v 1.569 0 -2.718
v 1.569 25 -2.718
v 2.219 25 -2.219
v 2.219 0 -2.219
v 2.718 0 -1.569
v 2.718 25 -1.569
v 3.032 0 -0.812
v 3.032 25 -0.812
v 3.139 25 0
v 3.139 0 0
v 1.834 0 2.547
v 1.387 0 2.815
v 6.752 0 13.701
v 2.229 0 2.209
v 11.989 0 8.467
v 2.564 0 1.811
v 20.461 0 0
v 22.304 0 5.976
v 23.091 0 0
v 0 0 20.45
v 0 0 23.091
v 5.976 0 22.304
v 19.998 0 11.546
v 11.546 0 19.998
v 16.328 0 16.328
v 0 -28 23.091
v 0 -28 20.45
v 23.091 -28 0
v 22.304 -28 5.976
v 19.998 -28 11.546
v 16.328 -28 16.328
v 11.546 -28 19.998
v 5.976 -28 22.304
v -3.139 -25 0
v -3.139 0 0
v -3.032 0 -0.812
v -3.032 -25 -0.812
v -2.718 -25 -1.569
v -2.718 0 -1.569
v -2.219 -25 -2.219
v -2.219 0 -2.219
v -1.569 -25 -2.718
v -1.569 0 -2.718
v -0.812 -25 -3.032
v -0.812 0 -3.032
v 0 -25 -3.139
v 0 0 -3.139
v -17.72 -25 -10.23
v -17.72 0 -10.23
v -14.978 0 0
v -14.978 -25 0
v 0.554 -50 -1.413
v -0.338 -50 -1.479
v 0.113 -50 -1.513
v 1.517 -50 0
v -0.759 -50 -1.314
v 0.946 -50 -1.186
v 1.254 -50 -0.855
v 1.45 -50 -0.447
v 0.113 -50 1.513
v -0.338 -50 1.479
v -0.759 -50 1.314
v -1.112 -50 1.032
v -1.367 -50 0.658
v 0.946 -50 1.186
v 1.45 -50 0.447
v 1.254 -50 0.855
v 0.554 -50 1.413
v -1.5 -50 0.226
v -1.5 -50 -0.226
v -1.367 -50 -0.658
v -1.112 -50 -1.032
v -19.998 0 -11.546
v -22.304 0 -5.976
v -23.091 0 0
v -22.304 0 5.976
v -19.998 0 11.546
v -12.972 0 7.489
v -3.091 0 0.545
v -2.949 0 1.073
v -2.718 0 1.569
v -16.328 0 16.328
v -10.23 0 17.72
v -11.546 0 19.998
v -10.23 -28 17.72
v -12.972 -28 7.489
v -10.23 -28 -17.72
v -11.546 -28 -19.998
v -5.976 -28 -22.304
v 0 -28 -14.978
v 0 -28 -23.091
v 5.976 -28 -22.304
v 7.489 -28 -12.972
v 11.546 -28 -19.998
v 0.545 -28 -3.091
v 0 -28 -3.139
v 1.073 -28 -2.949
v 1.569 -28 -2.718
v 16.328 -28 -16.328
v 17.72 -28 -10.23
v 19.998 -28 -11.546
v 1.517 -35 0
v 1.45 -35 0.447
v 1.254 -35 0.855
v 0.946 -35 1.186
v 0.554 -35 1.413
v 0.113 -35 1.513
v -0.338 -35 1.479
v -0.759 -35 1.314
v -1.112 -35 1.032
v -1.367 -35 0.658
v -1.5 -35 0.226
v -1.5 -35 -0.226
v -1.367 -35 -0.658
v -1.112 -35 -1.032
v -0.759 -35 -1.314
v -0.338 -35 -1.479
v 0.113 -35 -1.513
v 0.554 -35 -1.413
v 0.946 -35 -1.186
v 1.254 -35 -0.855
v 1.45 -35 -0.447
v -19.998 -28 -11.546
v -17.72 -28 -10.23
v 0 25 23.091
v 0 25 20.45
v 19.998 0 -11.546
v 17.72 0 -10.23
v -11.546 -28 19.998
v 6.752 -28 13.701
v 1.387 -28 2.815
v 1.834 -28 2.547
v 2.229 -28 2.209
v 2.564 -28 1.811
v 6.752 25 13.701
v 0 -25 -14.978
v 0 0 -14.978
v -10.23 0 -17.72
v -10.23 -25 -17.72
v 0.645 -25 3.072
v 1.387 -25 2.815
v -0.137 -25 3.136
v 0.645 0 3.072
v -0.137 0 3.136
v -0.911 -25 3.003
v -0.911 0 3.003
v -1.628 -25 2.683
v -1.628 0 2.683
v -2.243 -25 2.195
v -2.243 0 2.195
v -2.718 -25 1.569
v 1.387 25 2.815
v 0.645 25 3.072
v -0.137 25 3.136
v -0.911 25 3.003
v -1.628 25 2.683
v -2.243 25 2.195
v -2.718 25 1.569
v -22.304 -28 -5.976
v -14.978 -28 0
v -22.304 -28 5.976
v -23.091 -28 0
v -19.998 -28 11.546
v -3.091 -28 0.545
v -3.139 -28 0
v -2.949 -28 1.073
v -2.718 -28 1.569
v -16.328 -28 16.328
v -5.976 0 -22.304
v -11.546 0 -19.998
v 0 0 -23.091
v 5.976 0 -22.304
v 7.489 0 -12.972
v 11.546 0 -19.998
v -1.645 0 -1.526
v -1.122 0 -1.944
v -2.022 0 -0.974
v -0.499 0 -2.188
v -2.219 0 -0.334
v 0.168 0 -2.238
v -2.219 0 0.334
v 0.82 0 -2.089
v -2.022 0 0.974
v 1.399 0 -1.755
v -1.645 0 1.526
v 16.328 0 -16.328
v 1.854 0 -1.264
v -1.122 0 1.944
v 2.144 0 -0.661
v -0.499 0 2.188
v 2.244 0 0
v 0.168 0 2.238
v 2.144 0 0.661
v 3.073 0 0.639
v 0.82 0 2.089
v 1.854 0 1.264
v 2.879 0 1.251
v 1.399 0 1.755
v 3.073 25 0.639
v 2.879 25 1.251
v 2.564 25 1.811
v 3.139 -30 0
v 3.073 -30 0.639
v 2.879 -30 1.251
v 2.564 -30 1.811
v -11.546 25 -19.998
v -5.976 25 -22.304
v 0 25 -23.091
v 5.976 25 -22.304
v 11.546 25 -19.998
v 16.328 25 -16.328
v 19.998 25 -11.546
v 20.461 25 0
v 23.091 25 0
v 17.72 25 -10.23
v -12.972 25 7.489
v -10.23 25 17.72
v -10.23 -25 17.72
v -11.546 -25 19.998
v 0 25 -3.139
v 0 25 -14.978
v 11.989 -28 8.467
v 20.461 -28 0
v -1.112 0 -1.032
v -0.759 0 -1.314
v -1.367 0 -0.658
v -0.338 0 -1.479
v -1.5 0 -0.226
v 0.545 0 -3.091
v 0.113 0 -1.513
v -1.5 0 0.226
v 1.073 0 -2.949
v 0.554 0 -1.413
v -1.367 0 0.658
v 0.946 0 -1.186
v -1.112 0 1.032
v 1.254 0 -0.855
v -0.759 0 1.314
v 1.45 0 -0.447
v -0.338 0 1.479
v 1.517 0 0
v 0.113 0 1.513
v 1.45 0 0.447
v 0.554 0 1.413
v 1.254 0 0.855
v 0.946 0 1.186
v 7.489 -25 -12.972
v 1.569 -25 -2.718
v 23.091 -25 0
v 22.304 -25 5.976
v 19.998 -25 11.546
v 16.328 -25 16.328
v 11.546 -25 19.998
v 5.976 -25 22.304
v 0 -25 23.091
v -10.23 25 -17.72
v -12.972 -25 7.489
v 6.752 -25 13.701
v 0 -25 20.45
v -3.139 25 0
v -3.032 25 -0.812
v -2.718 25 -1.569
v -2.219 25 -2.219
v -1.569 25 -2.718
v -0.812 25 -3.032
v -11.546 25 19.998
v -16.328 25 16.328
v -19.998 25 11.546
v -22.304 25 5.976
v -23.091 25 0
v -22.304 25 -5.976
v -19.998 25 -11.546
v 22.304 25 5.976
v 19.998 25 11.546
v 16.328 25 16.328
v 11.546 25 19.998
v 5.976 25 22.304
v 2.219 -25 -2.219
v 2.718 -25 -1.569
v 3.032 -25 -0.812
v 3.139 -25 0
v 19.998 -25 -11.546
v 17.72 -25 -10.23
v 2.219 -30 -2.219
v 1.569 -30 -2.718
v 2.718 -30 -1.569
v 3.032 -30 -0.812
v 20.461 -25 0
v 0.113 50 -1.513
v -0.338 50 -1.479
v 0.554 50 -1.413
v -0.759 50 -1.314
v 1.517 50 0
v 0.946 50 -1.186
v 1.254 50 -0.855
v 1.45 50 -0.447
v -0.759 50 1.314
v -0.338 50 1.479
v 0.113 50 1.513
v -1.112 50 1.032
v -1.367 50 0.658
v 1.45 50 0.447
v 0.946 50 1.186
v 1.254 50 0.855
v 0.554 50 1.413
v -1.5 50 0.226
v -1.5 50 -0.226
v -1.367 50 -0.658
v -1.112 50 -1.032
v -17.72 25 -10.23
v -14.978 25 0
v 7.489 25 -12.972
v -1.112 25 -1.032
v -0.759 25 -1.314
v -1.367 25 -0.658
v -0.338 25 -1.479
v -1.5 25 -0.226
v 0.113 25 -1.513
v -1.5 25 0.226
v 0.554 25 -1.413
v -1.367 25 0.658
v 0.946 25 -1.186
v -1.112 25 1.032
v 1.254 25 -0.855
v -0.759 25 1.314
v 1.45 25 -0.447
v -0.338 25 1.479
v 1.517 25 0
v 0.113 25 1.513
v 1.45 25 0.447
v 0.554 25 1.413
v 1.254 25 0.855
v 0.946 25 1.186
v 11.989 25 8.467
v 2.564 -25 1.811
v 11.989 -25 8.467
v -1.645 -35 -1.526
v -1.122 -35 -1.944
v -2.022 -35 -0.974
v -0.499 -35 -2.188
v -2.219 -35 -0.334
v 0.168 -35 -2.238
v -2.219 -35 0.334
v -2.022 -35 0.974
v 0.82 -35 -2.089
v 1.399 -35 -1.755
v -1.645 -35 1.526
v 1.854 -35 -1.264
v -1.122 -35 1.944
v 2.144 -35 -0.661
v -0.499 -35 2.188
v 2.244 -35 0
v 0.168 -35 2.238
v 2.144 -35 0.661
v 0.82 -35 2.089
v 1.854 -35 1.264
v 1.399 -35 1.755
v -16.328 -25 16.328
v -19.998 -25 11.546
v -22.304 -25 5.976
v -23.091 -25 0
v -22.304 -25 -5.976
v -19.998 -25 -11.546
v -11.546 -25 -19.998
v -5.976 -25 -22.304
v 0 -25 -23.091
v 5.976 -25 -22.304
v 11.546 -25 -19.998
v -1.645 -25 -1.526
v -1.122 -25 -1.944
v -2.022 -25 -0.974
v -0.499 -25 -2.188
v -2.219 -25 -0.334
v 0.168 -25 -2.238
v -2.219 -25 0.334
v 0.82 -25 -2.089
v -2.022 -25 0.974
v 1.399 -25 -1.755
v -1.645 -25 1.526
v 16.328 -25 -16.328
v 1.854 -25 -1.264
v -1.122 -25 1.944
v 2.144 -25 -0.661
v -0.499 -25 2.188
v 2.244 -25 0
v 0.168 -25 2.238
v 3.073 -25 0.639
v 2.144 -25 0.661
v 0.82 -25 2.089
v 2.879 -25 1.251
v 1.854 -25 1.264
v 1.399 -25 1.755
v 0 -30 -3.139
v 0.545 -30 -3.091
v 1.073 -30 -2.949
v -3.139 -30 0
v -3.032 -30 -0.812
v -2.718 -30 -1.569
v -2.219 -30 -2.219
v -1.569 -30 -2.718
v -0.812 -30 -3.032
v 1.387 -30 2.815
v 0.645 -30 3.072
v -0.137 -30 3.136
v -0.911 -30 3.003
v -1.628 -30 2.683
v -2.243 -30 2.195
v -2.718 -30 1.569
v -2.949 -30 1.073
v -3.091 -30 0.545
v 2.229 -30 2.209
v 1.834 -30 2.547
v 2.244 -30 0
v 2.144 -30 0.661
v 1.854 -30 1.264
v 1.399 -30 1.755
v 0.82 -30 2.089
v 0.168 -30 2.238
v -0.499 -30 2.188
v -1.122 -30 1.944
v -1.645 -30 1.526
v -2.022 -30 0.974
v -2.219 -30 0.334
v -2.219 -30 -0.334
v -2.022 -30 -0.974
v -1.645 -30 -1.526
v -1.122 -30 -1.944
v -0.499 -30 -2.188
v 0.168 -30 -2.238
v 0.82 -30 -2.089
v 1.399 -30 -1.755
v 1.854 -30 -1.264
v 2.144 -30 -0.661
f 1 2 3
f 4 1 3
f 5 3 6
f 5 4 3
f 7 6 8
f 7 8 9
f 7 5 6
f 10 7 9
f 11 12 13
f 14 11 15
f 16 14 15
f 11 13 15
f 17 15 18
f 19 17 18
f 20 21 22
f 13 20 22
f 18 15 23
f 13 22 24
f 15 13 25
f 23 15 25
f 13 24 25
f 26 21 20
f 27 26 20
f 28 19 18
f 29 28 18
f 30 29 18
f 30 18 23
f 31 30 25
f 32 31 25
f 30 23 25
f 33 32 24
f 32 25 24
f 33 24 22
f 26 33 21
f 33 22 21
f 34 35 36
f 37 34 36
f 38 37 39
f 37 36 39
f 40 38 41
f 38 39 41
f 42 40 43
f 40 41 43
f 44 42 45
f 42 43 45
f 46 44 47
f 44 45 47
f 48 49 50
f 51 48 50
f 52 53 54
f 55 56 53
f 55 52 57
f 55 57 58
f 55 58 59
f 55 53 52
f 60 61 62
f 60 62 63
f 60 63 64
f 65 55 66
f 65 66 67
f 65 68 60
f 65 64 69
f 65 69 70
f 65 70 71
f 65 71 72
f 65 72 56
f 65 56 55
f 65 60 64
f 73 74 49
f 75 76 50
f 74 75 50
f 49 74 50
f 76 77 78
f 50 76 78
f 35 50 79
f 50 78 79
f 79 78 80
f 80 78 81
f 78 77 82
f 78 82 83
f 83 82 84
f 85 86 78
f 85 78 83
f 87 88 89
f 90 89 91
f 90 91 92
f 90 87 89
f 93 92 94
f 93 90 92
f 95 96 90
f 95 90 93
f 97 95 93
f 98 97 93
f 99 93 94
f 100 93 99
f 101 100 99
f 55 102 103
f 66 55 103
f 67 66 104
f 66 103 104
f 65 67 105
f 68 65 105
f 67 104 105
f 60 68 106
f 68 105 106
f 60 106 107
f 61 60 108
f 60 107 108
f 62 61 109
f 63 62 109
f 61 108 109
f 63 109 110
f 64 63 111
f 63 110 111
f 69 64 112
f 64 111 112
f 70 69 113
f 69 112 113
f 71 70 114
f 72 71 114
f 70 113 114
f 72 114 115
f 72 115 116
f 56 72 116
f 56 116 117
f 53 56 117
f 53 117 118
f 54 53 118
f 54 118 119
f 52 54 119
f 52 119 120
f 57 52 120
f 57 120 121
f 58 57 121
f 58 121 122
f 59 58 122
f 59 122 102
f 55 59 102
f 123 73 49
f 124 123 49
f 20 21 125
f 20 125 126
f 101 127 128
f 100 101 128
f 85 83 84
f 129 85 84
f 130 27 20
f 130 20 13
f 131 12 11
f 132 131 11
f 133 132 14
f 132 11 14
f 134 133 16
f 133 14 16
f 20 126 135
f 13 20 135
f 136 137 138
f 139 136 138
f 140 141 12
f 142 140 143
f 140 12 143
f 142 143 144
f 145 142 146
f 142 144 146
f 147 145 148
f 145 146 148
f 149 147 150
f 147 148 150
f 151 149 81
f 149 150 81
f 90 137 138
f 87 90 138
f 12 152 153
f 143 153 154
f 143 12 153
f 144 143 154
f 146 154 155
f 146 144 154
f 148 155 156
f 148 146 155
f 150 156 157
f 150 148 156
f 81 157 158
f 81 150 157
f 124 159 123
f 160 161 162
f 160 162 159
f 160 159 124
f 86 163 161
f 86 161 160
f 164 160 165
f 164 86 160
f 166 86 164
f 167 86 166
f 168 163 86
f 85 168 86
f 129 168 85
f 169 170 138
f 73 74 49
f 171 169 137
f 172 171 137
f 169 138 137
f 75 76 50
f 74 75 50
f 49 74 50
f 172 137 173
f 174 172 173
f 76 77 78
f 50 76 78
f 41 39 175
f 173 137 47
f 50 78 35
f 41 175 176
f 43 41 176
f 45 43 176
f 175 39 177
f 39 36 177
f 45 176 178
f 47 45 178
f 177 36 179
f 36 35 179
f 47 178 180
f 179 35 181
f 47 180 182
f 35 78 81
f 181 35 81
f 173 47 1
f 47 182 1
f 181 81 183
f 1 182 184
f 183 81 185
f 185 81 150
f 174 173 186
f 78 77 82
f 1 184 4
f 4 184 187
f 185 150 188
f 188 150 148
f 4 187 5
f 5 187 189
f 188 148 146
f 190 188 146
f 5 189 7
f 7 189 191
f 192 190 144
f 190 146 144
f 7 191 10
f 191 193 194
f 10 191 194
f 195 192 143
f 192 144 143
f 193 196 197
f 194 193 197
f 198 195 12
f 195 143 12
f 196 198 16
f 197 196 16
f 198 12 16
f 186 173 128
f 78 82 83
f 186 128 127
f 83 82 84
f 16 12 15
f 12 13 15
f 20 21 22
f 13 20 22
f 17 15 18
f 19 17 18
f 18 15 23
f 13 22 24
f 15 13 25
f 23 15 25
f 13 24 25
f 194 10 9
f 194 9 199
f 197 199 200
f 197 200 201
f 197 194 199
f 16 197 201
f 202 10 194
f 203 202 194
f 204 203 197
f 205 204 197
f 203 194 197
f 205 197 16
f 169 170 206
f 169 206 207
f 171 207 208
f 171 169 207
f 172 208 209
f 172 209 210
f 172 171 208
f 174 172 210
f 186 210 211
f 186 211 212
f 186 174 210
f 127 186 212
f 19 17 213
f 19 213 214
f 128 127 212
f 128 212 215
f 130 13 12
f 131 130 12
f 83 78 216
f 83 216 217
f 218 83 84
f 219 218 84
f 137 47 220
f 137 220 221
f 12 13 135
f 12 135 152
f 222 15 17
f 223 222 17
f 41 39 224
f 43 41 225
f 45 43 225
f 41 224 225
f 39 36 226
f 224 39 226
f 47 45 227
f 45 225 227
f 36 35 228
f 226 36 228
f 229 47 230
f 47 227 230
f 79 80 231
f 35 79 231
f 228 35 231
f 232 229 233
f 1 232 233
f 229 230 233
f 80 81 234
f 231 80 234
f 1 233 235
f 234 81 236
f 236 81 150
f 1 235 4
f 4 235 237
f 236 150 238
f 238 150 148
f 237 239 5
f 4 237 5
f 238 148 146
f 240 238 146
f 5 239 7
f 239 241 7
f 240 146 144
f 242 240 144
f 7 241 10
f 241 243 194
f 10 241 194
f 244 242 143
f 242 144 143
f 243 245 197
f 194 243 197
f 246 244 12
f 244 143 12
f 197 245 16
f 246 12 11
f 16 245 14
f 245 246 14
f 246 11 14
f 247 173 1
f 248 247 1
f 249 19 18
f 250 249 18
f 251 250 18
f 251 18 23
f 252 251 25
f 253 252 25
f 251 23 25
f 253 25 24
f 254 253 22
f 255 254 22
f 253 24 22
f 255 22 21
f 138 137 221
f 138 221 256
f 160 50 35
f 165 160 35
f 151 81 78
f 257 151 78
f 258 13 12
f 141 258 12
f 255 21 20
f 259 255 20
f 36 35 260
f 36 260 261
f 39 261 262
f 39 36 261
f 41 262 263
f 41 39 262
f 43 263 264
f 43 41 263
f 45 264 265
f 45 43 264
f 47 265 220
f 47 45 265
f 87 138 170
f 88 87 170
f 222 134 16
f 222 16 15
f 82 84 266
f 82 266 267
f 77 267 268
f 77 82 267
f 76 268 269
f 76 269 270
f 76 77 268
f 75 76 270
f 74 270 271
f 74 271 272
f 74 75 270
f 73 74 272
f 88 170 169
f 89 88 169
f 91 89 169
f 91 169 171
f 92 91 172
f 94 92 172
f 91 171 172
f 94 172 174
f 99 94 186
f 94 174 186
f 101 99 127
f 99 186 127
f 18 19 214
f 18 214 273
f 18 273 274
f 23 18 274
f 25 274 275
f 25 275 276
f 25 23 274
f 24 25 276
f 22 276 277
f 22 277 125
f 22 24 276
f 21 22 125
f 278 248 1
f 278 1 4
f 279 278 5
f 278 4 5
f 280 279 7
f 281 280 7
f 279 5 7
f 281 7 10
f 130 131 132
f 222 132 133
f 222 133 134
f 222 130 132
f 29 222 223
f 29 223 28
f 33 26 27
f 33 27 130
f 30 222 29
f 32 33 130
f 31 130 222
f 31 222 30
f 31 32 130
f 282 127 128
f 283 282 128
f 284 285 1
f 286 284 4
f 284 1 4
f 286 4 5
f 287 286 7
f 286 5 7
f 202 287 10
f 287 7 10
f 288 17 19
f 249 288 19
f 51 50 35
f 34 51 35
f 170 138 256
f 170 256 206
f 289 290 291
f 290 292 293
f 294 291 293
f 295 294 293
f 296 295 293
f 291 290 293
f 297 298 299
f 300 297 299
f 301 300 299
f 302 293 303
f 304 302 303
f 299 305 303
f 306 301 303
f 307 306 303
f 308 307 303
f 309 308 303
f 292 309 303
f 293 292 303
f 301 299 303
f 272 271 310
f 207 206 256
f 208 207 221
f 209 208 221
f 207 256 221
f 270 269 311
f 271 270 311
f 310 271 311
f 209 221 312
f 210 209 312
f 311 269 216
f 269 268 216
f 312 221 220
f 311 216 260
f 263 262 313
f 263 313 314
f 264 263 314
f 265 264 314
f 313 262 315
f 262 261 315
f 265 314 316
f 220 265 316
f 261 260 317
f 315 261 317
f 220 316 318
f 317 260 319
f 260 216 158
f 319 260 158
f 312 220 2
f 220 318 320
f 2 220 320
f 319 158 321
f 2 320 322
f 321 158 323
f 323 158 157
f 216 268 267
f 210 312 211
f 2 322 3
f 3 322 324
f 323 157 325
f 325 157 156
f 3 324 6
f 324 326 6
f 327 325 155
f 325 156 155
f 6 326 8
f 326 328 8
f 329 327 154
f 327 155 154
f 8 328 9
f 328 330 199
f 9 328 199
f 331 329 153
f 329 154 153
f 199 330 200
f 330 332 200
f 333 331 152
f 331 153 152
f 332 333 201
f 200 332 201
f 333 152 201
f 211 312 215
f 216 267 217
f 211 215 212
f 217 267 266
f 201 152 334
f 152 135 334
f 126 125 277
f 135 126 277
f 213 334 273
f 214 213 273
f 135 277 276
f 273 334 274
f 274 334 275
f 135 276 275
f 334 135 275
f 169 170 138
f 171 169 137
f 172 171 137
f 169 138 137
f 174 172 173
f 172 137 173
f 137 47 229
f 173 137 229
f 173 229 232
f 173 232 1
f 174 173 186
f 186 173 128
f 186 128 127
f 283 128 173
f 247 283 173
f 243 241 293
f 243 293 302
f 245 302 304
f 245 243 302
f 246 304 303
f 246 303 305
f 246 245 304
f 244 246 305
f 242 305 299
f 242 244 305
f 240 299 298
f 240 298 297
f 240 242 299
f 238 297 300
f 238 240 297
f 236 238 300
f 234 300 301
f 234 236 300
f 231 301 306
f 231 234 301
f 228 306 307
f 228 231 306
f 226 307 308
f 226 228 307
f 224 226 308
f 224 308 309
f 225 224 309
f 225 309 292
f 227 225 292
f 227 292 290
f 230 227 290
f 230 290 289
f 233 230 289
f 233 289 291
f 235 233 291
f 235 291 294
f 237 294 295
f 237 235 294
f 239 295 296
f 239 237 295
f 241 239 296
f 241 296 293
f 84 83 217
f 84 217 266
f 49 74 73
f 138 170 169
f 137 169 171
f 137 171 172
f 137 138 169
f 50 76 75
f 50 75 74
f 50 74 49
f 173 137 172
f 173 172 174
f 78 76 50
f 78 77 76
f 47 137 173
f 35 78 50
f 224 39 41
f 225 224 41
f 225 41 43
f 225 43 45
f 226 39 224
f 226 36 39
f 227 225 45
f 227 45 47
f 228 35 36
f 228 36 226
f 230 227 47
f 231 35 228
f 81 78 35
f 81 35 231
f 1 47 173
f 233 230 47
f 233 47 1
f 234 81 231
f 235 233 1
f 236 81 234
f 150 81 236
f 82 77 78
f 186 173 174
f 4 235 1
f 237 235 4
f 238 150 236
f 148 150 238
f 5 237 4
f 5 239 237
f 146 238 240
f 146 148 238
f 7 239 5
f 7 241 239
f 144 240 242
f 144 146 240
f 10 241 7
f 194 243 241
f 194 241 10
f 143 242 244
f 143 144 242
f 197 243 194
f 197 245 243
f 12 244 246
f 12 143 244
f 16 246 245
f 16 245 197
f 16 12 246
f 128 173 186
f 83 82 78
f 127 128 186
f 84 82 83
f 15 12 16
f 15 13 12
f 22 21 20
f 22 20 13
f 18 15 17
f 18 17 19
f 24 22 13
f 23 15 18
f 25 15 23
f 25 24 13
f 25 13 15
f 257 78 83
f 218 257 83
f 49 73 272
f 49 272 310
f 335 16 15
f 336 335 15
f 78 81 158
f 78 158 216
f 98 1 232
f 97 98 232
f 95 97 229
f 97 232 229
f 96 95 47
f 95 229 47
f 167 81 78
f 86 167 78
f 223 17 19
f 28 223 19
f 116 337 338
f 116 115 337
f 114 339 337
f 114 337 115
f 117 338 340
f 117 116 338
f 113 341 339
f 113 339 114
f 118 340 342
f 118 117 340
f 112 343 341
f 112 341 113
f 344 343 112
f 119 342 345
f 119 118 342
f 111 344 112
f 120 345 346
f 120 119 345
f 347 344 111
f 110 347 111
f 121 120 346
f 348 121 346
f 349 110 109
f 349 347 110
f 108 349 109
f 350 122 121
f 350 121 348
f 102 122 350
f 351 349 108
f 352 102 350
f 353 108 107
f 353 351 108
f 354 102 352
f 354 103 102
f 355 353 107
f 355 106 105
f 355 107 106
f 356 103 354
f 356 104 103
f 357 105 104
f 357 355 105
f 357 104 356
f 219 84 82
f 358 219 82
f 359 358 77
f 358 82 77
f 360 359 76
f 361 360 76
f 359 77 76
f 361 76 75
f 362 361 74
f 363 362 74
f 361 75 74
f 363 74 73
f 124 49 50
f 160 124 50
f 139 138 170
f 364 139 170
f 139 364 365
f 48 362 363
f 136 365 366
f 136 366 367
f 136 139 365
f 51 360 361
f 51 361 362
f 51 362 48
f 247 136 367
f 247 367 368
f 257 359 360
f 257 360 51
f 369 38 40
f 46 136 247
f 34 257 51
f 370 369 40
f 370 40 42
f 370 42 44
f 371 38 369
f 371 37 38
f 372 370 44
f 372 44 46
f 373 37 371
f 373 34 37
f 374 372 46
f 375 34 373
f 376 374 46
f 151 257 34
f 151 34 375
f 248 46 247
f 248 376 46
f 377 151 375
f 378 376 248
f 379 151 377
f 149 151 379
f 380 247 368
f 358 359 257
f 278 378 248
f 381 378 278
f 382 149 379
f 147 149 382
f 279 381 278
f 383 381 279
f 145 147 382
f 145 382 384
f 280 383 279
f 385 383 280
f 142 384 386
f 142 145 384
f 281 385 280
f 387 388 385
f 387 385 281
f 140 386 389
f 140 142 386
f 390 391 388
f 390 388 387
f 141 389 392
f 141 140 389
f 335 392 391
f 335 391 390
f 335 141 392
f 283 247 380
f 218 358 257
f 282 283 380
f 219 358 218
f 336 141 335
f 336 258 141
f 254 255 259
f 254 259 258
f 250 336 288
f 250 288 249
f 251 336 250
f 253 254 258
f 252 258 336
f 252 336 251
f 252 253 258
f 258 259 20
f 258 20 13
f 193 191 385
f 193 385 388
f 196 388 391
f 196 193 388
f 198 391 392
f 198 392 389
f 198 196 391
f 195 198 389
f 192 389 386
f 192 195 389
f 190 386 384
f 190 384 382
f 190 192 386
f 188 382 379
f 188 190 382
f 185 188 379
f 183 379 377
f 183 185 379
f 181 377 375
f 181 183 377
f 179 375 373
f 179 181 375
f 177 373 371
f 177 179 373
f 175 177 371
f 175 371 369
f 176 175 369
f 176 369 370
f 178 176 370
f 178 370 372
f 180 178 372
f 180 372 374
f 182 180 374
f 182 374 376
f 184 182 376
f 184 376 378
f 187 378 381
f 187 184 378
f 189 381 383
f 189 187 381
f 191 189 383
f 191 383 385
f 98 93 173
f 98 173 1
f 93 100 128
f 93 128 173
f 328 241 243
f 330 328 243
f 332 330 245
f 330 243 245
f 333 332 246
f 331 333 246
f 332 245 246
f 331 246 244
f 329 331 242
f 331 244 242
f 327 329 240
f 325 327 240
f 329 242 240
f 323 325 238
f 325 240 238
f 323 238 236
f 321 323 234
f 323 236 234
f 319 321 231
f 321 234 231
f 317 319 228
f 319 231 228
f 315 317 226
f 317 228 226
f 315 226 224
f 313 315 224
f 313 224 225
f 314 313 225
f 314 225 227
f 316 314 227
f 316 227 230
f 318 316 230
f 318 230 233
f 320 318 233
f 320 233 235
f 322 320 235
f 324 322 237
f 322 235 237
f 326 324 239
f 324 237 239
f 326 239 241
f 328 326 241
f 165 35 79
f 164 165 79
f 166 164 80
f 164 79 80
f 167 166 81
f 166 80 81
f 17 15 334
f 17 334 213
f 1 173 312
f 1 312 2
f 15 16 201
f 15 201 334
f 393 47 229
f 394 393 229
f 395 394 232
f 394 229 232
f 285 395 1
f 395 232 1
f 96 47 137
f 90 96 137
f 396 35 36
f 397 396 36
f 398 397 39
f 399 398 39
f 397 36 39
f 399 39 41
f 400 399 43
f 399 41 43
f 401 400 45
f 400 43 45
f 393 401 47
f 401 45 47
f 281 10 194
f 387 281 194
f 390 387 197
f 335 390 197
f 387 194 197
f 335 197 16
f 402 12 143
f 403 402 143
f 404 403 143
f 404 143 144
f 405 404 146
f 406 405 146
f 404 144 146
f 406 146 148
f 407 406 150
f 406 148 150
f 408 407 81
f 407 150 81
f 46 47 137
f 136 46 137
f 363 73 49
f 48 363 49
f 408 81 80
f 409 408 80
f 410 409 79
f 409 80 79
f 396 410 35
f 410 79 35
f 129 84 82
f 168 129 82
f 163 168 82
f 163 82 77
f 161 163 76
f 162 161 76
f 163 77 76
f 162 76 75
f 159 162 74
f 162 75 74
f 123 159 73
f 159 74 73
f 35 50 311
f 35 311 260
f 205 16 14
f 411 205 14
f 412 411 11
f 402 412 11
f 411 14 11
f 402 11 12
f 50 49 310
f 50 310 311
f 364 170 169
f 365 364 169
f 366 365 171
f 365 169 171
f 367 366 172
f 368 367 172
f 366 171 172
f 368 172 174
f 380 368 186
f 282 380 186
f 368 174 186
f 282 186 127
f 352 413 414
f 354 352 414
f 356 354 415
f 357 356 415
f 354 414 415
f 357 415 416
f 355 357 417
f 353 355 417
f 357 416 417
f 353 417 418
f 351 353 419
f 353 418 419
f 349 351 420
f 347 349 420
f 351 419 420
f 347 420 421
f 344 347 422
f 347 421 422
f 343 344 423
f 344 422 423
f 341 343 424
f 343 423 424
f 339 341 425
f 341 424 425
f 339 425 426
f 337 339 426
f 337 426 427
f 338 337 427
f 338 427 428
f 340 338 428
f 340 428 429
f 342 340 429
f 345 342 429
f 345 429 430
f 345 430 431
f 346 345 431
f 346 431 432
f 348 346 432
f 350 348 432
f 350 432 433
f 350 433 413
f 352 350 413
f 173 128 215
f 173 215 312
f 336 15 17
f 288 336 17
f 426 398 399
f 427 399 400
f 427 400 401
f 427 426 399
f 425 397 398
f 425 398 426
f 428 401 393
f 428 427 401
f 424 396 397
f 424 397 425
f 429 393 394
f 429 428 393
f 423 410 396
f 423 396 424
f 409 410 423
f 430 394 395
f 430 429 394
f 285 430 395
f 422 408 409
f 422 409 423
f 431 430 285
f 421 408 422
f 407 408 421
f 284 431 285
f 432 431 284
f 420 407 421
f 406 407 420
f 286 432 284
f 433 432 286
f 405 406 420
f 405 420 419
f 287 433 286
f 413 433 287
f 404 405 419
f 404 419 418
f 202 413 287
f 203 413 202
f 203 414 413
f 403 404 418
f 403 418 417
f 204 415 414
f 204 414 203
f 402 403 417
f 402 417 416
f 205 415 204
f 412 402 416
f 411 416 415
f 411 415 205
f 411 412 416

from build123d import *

# Parameters (mm, degrees)
F1_DEPTH = 28
F0_R     = 2.244167
F2_DEPTH = 30
F0_R_2   = 1.517404
F3_DEPTH = 35
F4_DEPTH = 50
F5_DEPTH = 50
F6_DEPTH = 25
F7_DEPTH = 25


with BuildPart() as f1:
    # F0 (on Front) → F1 (new body)
    with BuildSketch(Plane.XZ):
        with BuildLine():
            ThreePointArc((-3.138548, 0), (-3.031604, 0.812316), (-2.718062, 1.569274))
            Line((-2.718062, 1.569274), (-12.971652, 7.489187))
            Line((-12.971652, 7.489187), (-10.23042, 17.719606))
            Line((-10.23042, 17.719606), (-11.545612, 19.997586))
            ThreePointArc((-11.545612, 19.997586), (-22.30441, 5.976449), (-19.997586, -11.545612))
            Line((-19.997586, -11.545612), (-17.719606, -10.23042))
            Line((-17.719606, -10.23042), (-14.978374, 0))
            Line((-14.978374, 0), (-3.138548, 0))
        make_face()
        with BuildLine():
            ThreePointArc((1.38747, 2.81521), (2.038439, 2.386472), (2.563677, 1.810537))
            Line((2.563677, 1.810537), (11.989142, 8.467054))
            Line((11.989142, 8.467054), (20.460839, 0))
            Line((20.460839, 0), (23.091224, 0))
            ThreePointArc((23.091224, 0), (16.327961, 16.327961), (0, 23.091224))
            Line((0, 23.091224), (0, 20.449624))
            Line((0, 20.449624), (6.752447, 13.700878))
            Line((6.752447, 13.700878), (1.38747, 2.81521))
        make_face()
        with BuildLine():
            Line((7.489187, -12.971652), (1.569274, -2.718062))
            ThreePointArc((1.569274, -2.718062), (0.812316, -3.031604), (0, -3.138548))
            Line((0, -3.138548), (0, -14.978374))
            Line((0, -14.978374), (-10.23042, -17.719606))
            Line((-10.23042, -17.719606), (-11.545612, -19.997586))
            ThreePointArc((-11.545612, -19.997586), (5.976449, -22.30441), (19.997586, -11.545612))
            Line((19.997586, -11.545612), (17.719606, -10.23042))
            Line((17.719606, -10.23042), (7.489187, -12.971652))
        make_face()
    extrude(amount=F1_DEPTH)


with BuildPart() as f2:
    # F0 (on Front) → F2 (new body)
    with BuildSketch(Plane.XZ):
        with BuildLine():
            ThreePointArc((1.569274, -2.718062), (2.718062, -1.569274), (3.138548, 0))
            ThreePointArc((3.138548, 0), (2.99138, 0.949806), (2.563677, 1.810537))
            ThreePointArc((2.563677, 1.810537), (2.038439, 2.386472), (1.38747, 2.81521))
            ThreePointArc((1.38747, 2.81521), (-0.911432, 3.003294), (-2.718062, 1.569274))
            ThreePointArc((-2.718062, 1.569274), (-3.031604, 0.812316), (-3.138548, 0))
            ThreePointArc((-3.138548, 0), (-2.219288, -2.219288), (0, -3.138548))
            ThreePointArc((0, -3.138548), (0.812316, -3.031604), (1.569274, -2.718062))
        make_face()
        Circle(F0_R, mode=Mode.SUBTRACT)
    extrude(amount=F2_DEPTH)

    # F0 (on Front) → F3 (join)
    with BuildSketch(Plane.XZ):
        Circle(F0_R)
        Circle(F0_R_2, mode=Mode.SUBTRACT)
    extrude(amount=F3_DEPTH)

    # F0 (on Front) → F4 (join)
    with BuildSketch(Plane.XZ):
        Circle(F0_R_2)
    extrude(amount=F4_DEPTH)

    # F0 (on Front) → F5 (join)
    with BuildSketch(Plane.XZ):
        Circle(F0_R_2)
    extrude(amount=-F5_DEPTH)


with BuildPart() as f6:
    # F0 (on Front) → F6 (new body)
    with BuildSketch(Plane.XZ):
        with BuildLine():
            ThreePointArc((1.38747, 2.81521), (2.038439, 2.386472), (2.563677, 1.810537))
            Line((2.563677, 1.810537), (11.989142, 8.467054))
            Line((11.989142, 8.467054), (20.460839, 0))
            Line((20.460839, 0), (23.091224, 0))
            ThreePointArc((23.091224, 0), (16.327961, 16.327961), (0, 23.091224))
            Line((0, 23.091224), (0, 20.449624))
            Line((0, 20.449624), (6.752447, 13.700878))
            Line((6.752447, 13.700878), (1.38747, 2.81521))
        make_face()
        with BuildLine():
            ThreePointArc((-3.138548, 0), (-3.031604, 0.812316), (-2.718062, 1.569274))
            Line((-2.718062, 1.569274), (-12.971652, 7.489187))
            Line((-12.971652, 7.489187), (-10.23042, 17.719606))
            Line((-10.23042, 17.719606), (-11.545612, 19.997586))
            ThreePointArc((-11.545612, 19.997586), (-22.30441, 5.976449), (-19.997586, -11.545612))
            Line((-19.997586, -11.545612), (-17.719606, -10.23042))
            Line((-17.719606, -10.23042), (-14.978374, 0))
            Line((-14.978374, 0), (-3.138548, 0))
        make_face()
        with BuildLine():
            Line((7.489187, -12.971652), (1.569274, -2.718062))
            ThreePointArc((1.569274, -2.718062), (0.812316, -3.031604), (0, -3.138548))
            Line((0, -3.138548), (0, -14.978374))
            Line((0, -14.978374), (-10.23042, -17.719606))
            Line((-10.23042, -17.719606), (-11.545612, -19.997586))
            ThreePointArc((-11.545612, -19.997586), (5.976449, -22.30441), (19.997586, -11.545612))
            Line((19.997586, -11.545612), (17.719606, -10.23042))
            Line((17.719606, -10.23042), (7.489187, -12.971652))
        make_face()
        with BuildLine():
            ThreePointArc((1.569274, -2.718062), (2.718062, -1.569274), (3.138548, 0))
            ThreePointArc((3.138548, 0), (2.99138, 0.949806), (2.563677, 1.810537))
            ThreePointArc((2.563677, 1.810537), (2.038439, 2.386472), (1.38747, 2.81521))
            ThreePointArc((1.38747, 2.81521), (-0.911432, 3.003294), (-2.718062, 1.569274))
            ThreePointArc((-2.718062, 1.569274), (-3.031604, 0.812316), (-3.138548, 0))
            ThreePointArc((-3.138548, 0), (-2.219288, -2.219288), (0, -3.138548))
            ThreePointArc((0, -3.138548), (0.812316, -3.031604), (1.569274, -2.718062))
        make_face()
        Circle(F0_R, mode=Mode.SUBTRACT)
        Circle(F0_R)
        Circle(F0_R_2, mode=Mode.SUBTRACT)
    extrude(amount=-F6_DEPTH)


with BuildPart() as f7:
    # F0 (on Front) → F7 (new body)
    with BuildSketch(Plane.XZ):
        with BuildLine():
            ThreePointArc((1.569274, -2.718062), (2.718062, -1.569274), (3.138548, 0))
            ThreePointArc((3.138548, 0), (2.99138, 0.949806), (2.563677, 1.810537))
            ThreePointArc((2.563677, 1.810537), (2.038439, 2.386472), (1.38747, 2.81521))
            ThreePointArc((1.38747, 2.81521), (-0.911432, 3.003294), (-2.718062, 1.569274))
            ThreePointArc((-2.718062, 1.569274), (-3.031604, 0.812316), (-3.138548, 0))
            ThreePointArc((-3.138548, 0), (-2.219288, -2.219288), (0, -3.138548))
            ThreePointArc((0, -3.138548), (0.812316, -3.031604), (1.569274, -2.718062))
        make_face()
        Circle(F0_R, mode=Mode.SUBTRACT)
        with BuildLine():
            ThreePointArc((1.38747, 2.81521), (2.038439, 2.386472), (2.563677, 1.810537))
            Line((2.563677, 1.810537), (11.989142, 8.467054))
            Line((11.989142, 8.467054), (20.460839, 0))
            Line((20.460839, 0), (23.091224, 0))
            ThreePointArc((23.091224, 0), (16.327961, 16.327961), (0, 23.091224))
            Line((0, 23.091224), (0, 20.449624))
            Line((0, 20.449624), (6.752447, 13.700878))
            Line((6.752447, 13.700878), (1.38747, 2.81521))
        make_face()
        with BuildLine():
            Line((7.489187, -12.971652), (1.569274, -2.718062))
            ThreePointArc((1.569274, -2.718062), (0.812316, -3.031604), (0, -3.138548))
            Line((0, -3.138548), (0, -14.978374))
            Line((0, -14.978374), (-10.23042, -17.719606))
            Line((-10.23042, -17.719606), (-11.545612, -19.997586))
            ThreePointArc((-11.545612, -19.997586), (5.976449, -22.30441), (19.997586, -11.545612))
            Line((19.997586, -11.545612), (17.719606, -10.23042))
            Line((17.719606, -10.23042), (7.489187, -12.971652))
        make_face()
        with BuildLine():
            ThreePointArc((-3.138548, 0), (-3.031604, 0.812316), (-2.718062, 1.569274))
            Line((-2.718062, 1.569274), (-12.971652, 7.489187))
            Line((-12.971652, 7.489187), (-10.23042, 17.719606))
            Line((-10.23042, 17.719606), (-11.545612, 19.997586))
            ThreePointArc((-11.545612, 19.997586), (-22.30441, 5.976449), (-19.997586, -11.545612))
            Line((-19.997586, -11.545612), (-17.719606, -10.23042))
            Line((-17.719606, -10.23042), (-14.978374, 0))
            Line((-14.978374, 0), (-3.138548, 0))
        make_face()
    extrude(amount=F7_DEPTH)


solid = Compound([f1.part, f2.part, f6.part, f7.part])
